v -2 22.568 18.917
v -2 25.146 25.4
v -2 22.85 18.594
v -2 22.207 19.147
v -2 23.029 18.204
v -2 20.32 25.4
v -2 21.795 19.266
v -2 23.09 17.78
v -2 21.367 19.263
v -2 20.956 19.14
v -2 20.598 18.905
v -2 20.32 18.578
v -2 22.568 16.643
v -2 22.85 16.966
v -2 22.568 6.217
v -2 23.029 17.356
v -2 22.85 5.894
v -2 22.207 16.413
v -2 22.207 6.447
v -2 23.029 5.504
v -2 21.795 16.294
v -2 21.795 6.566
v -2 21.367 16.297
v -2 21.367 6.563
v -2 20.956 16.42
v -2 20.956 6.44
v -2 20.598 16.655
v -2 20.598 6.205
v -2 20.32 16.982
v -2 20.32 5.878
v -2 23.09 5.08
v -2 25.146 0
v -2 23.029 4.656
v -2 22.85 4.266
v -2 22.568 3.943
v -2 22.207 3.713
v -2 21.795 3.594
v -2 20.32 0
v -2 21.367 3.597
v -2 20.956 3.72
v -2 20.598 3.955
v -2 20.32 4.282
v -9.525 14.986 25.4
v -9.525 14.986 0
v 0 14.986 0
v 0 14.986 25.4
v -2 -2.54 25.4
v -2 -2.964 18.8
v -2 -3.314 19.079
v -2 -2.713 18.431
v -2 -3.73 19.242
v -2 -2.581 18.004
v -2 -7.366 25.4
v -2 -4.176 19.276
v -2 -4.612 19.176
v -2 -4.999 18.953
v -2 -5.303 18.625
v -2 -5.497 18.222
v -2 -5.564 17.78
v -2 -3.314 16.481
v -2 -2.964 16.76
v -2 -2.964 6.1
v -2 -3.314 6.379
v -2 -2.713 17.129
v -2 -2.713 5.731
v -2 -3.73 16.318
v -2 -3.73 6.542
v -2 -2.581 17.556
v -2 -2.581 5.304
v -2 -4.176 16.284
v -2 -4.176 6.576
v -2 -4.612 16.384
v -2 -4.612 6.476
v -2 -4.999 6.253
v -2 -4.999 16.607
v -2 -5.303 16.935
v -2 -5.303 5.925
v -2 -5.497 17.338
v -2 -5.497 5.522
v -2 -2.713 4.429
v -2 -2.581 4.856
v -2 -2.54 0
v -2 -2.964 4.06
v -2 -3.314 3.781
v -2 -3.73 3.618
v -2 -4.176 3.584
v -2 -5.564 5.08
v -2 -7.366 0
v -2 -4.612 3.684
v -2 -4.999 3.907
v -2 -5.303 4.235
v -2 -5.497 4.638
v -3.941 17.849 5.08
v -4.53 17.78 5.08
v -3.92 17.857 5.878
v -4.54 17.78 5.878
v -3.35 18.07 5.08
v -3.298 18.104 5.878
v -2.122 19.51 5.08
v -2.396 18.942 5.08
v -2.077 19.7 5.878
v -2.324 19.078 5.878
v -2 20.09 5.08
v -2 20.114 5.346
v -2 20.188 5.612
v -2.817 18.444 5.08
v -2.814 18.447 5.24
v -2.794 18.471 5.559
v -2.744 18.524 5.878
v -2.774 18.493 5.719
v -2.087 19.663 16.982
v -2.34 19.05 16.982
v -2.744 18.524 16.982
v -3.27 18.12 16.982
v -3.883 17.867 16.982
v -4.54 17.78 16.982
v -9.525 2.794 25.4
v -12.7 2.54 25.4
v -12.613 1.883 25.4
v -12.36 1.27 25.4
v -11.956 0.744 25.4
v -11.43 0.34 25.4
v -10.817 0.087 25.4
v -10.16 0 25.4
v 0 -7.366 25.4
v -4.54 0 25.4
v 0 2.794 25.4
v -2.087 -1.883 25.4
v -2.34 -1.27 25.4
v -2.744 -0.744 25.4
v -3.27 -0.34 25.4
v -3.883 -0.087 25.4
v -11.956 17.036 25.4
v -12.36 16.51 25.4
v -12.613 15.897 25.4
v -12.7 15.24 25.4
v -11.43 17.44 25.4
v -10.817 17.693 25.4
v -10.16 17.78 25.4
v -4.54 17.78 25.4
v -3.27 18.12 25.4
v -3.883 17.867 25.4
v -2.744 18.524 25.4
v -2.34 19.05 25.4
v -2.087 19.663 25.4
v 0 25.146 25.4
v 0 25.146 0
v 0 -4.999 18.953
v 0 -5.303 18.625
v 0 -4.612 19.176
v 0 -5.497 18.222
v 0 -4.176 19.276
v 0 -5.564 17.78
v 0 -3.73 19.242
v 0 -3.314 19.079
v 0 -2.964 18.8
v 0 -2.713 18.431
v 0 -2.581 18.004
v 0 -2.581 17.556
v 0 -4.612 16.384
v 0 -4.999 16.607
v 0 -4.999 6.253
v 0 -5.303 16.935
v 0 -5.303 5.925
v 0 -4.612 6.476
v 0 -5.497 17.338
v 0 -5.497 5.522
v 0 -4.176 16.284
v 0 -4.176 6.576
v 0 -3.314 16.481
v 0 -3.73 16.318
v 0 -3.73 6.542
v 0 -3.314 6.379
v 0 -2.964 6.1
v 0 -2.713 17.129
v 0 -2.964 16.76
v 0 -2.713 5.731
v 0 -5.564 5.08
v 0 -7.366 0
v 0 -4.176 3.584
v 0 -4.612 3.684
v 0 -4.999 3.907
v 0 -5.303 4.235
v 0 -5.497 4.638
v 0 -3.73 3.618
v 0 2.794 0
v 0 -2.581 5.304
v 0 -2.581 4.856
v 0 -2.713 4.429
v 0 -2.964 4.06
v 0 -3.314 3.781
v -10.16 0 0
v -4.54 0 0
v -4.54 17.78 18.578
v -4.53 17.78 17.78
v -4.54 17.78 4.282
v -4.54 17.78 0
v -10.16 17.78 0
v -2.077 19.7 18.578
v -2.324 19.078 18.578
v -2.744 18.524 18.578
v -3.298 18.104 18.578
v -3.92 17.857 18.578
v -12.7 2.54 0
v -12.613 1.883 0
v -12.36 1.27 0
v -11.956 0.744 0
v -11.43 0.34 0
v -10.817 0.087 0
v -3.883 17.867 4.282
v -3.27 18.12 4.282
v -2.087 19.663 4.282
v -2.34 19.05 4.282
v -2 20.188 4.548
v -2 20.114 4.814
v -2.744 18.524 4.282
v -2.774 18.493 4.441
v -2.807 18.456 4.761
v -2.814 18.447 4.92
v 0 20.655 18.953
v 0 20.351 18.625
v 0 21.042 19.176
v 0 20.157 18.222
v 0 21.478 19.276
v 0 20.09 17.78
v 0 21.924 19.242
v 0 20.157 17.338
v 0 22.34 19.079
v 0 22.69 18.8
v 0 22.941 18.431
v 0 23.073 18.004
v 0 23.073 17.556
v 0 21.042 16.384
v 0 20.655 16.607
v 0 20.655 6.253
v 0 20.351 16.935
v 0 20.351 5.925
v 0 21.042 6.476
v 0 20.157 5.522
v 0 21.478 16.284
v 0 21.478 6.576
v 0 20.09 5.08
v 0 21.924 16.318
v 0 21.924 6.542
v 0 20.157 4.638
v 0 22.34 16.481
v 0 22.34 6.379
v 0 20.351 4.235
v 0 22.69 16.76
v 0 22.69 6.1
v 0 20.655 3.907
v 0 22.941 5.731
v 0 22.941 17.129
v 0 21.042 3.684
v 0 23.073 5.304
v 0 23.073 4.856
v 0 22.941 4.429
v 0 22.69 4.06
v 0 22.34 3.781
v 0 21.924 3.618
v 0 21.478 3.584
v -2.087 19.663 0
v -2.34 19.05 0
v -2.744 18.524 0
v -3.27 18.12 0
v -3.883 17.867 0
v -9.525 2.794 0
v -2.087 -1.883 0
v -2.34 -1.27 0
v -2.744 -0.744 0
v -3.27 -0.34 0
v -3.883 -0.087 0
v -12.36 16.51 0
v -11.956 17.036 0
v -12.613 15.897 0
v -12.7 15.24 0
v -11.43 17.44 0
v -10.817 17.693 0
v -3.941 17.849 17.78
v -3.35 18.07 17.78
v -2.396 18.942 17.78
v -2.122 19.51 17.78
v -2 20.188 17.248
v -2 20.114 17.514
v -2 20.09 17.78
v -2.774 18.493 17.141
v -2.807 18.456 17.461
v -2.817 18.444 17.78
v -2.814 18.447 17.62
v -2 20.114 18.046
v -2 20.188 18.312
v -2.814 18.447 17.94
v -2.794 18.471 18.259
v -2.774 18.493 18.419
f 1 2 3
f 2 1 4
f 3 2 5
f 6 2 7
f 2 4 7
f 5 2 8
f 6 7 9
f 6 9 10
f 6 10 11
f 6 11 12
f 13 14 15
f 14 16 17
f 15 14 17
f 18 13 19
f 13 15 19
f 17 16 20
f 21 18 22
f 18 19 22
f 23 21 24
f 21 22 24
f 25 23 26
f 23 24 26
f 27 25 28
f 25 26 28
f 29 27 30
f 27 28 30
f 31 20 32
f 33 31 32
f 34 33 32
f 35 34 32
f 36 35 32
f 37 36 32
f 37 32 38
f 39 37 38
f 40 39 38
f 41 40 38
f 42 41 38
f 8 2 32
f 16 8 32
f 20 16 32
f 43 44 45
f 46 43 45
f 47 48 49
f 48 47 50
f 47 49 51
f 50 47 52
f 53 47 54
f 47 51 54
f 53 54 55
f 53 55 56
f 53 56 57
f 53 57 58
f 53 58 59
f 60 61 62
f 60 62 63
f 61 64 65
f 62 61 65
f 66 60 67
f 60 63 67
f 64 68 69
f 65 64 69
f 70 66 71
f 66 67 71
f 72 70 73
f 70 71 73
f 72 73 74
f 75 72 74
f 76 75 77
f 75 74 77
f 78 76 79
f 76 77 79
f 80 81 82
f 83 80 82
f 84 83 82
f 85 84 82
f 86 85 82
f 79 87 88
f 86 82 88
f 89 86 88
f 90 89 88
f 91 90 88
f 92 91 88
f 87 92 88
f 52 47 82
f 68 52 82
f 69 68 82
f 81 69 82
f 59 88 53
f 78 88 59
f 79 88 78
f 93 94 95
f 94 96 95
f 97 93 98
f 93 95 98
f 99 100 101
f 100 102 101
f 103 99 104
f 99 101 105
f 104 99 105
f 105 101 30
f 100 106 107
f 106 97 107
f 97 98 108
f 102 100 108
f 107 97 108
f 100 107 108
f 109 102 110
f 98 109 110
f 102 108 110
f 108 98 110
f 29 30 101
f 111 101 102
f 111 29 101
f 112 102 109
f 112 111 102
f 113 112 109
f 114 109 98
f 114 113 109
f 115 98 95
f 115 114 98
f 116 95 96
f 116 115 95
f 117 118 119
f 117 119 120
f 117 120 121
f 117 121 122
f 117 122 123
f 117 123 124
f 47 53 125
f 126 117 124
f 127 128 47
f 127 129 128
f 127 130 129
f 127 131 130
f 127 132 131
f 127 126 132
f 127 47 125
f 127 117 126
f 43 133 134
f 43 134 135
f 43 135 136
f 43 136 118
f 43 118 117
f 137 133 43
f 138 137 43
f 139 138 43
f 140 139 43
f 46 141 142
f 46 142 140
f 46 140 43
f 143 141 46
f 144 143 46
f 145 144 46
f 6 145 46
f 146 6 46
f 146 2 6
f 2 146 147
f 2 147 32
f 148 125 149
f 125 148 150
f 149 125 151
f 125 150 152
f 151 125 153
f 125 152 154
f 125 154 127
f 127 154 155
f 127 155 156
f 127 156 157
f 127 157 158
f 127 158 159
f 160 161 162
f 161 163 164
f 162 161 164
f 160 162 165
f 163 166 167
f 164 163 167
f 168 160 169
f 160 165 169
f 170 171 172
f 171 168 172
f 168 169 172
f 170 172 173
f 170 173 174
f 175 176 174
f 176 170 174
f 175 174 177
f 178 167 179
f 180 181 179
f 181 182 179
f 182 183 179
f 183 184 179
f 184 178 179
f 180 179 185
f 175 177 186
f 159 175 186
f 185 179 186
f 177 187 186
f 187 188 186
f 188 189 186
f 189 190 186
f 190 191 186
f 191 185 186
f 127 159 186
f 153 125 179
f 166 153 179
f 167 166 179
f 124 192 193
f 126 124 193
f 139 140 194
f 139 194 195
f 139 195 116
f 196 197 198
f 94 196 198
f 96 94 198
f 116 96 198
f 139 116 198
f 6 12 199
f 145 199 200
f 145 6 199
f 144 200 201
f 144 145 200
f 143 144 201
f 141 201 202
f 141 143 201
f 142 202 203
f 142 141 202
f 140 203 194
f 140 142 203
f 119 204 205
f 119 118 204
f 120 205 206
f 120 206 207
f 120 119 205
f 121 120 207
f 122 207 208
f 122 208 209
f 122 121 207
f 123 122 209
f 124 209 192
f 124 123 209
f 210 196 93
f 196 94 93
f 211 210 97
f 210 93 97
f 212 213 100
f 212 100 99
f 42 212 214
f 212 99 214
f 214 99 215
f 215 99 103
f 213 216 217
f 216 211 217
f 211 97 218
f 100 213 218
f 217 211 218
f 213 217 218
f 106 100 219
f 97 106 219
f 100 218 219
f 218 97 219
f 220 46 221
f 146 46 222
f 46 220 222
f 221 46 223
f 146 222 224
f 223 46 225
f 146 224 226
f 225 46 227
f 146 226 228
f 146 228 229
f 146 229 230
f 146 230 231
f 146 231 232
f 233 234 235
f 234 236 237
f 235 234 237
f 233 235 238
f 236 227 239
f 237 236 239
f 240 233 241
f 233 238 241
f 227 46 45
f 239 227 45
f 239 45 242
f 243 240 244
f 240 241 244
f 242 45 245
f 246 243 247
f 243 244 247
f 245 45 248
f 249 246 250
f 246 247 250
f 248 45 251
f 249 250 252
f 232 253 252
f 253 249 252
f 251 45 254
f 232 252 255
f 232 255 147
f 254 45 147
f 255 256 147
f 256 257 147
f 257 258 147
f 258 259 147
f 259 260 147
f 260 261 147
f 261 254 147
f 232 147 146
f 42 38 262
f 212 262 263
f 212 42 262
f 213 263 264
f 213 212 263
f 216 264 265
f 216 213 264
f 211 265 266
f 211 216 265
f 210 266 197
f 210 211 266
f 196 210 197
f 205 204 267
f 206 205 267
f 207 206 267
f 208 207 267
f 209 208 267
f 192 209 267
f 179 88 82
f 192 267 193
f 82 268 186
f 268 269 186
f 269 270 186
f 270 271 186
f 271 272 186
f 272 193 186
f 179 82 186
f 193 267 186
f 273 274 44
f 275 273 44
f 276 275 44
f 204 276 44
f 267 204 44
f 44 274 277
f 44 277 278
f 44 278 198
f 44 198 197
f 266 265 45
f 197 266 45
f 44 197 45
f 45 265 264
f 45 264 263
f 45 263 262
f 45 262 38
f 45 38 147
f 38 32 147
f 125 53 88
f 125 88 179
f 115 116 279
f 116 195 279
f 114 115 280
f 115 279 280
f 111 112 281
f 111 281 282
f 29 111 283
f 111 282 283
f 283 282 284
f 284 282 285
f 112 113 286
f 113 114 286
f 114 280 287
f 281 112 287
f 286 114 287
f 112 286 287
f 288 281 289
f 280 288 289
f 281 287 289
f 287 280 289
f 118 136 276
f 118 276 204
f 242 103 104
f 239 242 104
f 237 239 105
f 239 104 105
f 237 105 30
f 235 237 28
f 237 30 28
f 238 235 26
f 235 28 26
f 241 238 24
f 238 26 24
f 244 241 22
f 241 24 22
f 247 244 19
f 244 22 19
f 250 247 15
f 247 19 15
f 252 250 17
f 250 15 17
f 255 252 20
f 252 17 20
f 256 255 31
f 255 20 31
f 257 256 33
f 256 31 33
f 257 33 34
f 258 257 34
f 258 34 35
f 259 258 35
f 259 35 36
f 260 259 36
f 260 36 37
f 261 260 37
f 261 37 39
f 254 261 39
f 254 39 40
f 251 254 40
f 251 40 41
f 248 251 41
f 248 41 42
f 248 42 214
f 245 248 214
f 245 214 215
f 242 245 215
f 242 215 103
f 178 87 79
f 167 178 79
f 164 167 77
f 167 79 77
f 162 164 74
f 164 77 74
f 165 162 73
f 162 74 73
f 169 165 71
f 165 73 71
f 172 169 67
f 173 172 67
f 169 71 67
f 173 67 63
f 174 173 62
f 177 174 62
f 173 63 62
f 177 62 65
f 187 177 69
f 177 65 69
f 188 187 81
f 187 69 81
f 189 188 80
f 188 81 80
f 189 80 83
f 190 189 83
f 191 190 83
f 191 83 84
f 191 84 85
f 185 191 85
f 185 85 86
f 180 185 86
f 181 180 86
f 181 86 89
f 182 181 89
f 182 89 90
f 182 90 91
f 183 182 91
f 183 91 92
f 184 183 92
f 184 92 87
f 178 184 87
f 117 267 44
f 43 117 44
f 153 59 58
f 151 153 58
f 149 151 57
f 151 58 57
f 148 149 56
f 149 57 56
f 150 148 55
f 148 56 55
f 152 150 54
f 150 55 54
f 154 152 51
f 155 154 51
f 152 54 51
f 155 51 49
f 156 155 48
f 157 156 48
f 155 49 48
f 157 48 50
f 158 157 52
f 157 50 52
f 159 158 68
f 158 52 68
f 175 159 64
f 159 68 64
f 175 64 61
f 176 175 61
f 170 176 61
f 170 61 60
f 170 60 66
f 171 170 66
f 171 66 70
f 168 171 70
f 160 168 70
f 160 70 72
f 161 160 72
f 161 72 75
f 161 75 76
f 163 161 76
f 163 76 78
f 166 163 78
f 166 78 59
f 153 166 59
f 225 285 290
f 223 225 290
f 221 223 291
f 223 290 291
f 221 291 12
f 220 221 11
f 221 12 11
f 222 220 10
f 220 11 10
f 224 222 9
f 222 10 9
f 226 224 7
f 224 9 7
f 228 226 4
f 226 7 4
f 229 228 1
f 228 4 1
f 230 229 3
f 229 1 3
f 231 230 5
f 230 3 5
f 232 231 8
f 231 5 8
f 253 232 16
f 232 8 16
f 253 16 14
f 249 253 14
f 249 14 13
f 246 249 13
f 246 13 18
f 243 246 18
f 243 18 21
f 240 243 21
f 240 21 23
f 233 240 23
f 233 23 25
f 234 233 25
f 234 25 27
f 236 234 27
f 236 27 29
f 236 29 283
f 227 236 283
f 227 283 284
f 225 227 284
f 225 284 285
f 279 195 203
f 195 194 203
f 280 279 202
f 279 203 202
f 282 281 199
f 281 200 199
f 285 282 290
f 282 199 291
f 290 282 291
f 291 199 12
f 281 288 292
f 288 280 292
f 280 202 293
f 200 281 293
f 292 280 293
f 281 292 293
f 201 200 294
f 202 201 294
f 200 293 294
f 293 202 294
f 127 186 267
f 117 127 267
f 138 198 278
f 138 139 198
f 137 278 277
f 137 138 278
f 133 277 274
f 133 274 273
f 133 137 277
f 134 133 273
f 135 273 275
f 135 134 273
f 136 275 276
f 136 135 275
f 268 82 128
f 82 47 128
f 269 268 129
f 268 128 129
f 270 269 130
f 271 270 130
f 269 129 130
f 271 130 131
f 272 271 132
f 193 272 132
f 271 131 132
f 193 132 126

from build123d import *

# Parameters (mm, degrees)
F1_DEPTH = 25.4
F2_R     = 1.5
F3_R     = 1.5
F4_DEPTH = 25.4
F5_R     = 2.54
F6_R     = 2.54


with BuildPart() as f1:
    # F0 (on Top) → F1 (new body)
    with BuildSketch(Plane.XY):
        Polygon((-2, -7.366), (0, -7.366), (0, 2.794), (-9.525, 2.794), (-9.525, 14.986), (0, 14.986), (0, 25.146), (-2, 25.146), (-2, 17.78), (-12.7, 17.78), (-12.7, 0), (-2, 0), align=None)
    extrude(amount=F1_DEPTH)

    # F2 (on face) + F3 (on face) → F4 (cut)
    with BuildSketch(Plane(origin=(-2, 0, 0), x_dir=(0, -1, 0), z_dir=(-1, 0, 0))):
        with Locations((4.064, 5.08)):
            Circle(F2_R)
        with Locations((4.064, 17.78)):
            Circle(F2_R)
    with BuildSketch(Plane(origin=(-2, 0, 0), x_dir=(0, -1, 0), z_dir=(-1, 0, 0))):
        with Locations((-21.59, 5.08)):
            Circle(F3_R)
        with Locations((-21.59, 17.78)):
            Circle(F3_R)
    extrude(amount=-F4_DEPTH, mode=Mode.SUBTRACT)

    # F5
    f5_edges = [f1.edges().sort_by_distance(p)[0] for p in [
        (-2, 17.78, 12.7),
        (-2, 0, 12.7),
    ]]
    fillet(f5_edges, radius=F5_R)

    # F6
    f6_edges = [f1.edges().sort_by_distance(p)[0] for p in [
        (-12.7, 0, 12.7),
        (-12.7, 17.78, 12.7),
    ]]
    fillet(f6_edges, radius=F6_R)


solid = f1.part
